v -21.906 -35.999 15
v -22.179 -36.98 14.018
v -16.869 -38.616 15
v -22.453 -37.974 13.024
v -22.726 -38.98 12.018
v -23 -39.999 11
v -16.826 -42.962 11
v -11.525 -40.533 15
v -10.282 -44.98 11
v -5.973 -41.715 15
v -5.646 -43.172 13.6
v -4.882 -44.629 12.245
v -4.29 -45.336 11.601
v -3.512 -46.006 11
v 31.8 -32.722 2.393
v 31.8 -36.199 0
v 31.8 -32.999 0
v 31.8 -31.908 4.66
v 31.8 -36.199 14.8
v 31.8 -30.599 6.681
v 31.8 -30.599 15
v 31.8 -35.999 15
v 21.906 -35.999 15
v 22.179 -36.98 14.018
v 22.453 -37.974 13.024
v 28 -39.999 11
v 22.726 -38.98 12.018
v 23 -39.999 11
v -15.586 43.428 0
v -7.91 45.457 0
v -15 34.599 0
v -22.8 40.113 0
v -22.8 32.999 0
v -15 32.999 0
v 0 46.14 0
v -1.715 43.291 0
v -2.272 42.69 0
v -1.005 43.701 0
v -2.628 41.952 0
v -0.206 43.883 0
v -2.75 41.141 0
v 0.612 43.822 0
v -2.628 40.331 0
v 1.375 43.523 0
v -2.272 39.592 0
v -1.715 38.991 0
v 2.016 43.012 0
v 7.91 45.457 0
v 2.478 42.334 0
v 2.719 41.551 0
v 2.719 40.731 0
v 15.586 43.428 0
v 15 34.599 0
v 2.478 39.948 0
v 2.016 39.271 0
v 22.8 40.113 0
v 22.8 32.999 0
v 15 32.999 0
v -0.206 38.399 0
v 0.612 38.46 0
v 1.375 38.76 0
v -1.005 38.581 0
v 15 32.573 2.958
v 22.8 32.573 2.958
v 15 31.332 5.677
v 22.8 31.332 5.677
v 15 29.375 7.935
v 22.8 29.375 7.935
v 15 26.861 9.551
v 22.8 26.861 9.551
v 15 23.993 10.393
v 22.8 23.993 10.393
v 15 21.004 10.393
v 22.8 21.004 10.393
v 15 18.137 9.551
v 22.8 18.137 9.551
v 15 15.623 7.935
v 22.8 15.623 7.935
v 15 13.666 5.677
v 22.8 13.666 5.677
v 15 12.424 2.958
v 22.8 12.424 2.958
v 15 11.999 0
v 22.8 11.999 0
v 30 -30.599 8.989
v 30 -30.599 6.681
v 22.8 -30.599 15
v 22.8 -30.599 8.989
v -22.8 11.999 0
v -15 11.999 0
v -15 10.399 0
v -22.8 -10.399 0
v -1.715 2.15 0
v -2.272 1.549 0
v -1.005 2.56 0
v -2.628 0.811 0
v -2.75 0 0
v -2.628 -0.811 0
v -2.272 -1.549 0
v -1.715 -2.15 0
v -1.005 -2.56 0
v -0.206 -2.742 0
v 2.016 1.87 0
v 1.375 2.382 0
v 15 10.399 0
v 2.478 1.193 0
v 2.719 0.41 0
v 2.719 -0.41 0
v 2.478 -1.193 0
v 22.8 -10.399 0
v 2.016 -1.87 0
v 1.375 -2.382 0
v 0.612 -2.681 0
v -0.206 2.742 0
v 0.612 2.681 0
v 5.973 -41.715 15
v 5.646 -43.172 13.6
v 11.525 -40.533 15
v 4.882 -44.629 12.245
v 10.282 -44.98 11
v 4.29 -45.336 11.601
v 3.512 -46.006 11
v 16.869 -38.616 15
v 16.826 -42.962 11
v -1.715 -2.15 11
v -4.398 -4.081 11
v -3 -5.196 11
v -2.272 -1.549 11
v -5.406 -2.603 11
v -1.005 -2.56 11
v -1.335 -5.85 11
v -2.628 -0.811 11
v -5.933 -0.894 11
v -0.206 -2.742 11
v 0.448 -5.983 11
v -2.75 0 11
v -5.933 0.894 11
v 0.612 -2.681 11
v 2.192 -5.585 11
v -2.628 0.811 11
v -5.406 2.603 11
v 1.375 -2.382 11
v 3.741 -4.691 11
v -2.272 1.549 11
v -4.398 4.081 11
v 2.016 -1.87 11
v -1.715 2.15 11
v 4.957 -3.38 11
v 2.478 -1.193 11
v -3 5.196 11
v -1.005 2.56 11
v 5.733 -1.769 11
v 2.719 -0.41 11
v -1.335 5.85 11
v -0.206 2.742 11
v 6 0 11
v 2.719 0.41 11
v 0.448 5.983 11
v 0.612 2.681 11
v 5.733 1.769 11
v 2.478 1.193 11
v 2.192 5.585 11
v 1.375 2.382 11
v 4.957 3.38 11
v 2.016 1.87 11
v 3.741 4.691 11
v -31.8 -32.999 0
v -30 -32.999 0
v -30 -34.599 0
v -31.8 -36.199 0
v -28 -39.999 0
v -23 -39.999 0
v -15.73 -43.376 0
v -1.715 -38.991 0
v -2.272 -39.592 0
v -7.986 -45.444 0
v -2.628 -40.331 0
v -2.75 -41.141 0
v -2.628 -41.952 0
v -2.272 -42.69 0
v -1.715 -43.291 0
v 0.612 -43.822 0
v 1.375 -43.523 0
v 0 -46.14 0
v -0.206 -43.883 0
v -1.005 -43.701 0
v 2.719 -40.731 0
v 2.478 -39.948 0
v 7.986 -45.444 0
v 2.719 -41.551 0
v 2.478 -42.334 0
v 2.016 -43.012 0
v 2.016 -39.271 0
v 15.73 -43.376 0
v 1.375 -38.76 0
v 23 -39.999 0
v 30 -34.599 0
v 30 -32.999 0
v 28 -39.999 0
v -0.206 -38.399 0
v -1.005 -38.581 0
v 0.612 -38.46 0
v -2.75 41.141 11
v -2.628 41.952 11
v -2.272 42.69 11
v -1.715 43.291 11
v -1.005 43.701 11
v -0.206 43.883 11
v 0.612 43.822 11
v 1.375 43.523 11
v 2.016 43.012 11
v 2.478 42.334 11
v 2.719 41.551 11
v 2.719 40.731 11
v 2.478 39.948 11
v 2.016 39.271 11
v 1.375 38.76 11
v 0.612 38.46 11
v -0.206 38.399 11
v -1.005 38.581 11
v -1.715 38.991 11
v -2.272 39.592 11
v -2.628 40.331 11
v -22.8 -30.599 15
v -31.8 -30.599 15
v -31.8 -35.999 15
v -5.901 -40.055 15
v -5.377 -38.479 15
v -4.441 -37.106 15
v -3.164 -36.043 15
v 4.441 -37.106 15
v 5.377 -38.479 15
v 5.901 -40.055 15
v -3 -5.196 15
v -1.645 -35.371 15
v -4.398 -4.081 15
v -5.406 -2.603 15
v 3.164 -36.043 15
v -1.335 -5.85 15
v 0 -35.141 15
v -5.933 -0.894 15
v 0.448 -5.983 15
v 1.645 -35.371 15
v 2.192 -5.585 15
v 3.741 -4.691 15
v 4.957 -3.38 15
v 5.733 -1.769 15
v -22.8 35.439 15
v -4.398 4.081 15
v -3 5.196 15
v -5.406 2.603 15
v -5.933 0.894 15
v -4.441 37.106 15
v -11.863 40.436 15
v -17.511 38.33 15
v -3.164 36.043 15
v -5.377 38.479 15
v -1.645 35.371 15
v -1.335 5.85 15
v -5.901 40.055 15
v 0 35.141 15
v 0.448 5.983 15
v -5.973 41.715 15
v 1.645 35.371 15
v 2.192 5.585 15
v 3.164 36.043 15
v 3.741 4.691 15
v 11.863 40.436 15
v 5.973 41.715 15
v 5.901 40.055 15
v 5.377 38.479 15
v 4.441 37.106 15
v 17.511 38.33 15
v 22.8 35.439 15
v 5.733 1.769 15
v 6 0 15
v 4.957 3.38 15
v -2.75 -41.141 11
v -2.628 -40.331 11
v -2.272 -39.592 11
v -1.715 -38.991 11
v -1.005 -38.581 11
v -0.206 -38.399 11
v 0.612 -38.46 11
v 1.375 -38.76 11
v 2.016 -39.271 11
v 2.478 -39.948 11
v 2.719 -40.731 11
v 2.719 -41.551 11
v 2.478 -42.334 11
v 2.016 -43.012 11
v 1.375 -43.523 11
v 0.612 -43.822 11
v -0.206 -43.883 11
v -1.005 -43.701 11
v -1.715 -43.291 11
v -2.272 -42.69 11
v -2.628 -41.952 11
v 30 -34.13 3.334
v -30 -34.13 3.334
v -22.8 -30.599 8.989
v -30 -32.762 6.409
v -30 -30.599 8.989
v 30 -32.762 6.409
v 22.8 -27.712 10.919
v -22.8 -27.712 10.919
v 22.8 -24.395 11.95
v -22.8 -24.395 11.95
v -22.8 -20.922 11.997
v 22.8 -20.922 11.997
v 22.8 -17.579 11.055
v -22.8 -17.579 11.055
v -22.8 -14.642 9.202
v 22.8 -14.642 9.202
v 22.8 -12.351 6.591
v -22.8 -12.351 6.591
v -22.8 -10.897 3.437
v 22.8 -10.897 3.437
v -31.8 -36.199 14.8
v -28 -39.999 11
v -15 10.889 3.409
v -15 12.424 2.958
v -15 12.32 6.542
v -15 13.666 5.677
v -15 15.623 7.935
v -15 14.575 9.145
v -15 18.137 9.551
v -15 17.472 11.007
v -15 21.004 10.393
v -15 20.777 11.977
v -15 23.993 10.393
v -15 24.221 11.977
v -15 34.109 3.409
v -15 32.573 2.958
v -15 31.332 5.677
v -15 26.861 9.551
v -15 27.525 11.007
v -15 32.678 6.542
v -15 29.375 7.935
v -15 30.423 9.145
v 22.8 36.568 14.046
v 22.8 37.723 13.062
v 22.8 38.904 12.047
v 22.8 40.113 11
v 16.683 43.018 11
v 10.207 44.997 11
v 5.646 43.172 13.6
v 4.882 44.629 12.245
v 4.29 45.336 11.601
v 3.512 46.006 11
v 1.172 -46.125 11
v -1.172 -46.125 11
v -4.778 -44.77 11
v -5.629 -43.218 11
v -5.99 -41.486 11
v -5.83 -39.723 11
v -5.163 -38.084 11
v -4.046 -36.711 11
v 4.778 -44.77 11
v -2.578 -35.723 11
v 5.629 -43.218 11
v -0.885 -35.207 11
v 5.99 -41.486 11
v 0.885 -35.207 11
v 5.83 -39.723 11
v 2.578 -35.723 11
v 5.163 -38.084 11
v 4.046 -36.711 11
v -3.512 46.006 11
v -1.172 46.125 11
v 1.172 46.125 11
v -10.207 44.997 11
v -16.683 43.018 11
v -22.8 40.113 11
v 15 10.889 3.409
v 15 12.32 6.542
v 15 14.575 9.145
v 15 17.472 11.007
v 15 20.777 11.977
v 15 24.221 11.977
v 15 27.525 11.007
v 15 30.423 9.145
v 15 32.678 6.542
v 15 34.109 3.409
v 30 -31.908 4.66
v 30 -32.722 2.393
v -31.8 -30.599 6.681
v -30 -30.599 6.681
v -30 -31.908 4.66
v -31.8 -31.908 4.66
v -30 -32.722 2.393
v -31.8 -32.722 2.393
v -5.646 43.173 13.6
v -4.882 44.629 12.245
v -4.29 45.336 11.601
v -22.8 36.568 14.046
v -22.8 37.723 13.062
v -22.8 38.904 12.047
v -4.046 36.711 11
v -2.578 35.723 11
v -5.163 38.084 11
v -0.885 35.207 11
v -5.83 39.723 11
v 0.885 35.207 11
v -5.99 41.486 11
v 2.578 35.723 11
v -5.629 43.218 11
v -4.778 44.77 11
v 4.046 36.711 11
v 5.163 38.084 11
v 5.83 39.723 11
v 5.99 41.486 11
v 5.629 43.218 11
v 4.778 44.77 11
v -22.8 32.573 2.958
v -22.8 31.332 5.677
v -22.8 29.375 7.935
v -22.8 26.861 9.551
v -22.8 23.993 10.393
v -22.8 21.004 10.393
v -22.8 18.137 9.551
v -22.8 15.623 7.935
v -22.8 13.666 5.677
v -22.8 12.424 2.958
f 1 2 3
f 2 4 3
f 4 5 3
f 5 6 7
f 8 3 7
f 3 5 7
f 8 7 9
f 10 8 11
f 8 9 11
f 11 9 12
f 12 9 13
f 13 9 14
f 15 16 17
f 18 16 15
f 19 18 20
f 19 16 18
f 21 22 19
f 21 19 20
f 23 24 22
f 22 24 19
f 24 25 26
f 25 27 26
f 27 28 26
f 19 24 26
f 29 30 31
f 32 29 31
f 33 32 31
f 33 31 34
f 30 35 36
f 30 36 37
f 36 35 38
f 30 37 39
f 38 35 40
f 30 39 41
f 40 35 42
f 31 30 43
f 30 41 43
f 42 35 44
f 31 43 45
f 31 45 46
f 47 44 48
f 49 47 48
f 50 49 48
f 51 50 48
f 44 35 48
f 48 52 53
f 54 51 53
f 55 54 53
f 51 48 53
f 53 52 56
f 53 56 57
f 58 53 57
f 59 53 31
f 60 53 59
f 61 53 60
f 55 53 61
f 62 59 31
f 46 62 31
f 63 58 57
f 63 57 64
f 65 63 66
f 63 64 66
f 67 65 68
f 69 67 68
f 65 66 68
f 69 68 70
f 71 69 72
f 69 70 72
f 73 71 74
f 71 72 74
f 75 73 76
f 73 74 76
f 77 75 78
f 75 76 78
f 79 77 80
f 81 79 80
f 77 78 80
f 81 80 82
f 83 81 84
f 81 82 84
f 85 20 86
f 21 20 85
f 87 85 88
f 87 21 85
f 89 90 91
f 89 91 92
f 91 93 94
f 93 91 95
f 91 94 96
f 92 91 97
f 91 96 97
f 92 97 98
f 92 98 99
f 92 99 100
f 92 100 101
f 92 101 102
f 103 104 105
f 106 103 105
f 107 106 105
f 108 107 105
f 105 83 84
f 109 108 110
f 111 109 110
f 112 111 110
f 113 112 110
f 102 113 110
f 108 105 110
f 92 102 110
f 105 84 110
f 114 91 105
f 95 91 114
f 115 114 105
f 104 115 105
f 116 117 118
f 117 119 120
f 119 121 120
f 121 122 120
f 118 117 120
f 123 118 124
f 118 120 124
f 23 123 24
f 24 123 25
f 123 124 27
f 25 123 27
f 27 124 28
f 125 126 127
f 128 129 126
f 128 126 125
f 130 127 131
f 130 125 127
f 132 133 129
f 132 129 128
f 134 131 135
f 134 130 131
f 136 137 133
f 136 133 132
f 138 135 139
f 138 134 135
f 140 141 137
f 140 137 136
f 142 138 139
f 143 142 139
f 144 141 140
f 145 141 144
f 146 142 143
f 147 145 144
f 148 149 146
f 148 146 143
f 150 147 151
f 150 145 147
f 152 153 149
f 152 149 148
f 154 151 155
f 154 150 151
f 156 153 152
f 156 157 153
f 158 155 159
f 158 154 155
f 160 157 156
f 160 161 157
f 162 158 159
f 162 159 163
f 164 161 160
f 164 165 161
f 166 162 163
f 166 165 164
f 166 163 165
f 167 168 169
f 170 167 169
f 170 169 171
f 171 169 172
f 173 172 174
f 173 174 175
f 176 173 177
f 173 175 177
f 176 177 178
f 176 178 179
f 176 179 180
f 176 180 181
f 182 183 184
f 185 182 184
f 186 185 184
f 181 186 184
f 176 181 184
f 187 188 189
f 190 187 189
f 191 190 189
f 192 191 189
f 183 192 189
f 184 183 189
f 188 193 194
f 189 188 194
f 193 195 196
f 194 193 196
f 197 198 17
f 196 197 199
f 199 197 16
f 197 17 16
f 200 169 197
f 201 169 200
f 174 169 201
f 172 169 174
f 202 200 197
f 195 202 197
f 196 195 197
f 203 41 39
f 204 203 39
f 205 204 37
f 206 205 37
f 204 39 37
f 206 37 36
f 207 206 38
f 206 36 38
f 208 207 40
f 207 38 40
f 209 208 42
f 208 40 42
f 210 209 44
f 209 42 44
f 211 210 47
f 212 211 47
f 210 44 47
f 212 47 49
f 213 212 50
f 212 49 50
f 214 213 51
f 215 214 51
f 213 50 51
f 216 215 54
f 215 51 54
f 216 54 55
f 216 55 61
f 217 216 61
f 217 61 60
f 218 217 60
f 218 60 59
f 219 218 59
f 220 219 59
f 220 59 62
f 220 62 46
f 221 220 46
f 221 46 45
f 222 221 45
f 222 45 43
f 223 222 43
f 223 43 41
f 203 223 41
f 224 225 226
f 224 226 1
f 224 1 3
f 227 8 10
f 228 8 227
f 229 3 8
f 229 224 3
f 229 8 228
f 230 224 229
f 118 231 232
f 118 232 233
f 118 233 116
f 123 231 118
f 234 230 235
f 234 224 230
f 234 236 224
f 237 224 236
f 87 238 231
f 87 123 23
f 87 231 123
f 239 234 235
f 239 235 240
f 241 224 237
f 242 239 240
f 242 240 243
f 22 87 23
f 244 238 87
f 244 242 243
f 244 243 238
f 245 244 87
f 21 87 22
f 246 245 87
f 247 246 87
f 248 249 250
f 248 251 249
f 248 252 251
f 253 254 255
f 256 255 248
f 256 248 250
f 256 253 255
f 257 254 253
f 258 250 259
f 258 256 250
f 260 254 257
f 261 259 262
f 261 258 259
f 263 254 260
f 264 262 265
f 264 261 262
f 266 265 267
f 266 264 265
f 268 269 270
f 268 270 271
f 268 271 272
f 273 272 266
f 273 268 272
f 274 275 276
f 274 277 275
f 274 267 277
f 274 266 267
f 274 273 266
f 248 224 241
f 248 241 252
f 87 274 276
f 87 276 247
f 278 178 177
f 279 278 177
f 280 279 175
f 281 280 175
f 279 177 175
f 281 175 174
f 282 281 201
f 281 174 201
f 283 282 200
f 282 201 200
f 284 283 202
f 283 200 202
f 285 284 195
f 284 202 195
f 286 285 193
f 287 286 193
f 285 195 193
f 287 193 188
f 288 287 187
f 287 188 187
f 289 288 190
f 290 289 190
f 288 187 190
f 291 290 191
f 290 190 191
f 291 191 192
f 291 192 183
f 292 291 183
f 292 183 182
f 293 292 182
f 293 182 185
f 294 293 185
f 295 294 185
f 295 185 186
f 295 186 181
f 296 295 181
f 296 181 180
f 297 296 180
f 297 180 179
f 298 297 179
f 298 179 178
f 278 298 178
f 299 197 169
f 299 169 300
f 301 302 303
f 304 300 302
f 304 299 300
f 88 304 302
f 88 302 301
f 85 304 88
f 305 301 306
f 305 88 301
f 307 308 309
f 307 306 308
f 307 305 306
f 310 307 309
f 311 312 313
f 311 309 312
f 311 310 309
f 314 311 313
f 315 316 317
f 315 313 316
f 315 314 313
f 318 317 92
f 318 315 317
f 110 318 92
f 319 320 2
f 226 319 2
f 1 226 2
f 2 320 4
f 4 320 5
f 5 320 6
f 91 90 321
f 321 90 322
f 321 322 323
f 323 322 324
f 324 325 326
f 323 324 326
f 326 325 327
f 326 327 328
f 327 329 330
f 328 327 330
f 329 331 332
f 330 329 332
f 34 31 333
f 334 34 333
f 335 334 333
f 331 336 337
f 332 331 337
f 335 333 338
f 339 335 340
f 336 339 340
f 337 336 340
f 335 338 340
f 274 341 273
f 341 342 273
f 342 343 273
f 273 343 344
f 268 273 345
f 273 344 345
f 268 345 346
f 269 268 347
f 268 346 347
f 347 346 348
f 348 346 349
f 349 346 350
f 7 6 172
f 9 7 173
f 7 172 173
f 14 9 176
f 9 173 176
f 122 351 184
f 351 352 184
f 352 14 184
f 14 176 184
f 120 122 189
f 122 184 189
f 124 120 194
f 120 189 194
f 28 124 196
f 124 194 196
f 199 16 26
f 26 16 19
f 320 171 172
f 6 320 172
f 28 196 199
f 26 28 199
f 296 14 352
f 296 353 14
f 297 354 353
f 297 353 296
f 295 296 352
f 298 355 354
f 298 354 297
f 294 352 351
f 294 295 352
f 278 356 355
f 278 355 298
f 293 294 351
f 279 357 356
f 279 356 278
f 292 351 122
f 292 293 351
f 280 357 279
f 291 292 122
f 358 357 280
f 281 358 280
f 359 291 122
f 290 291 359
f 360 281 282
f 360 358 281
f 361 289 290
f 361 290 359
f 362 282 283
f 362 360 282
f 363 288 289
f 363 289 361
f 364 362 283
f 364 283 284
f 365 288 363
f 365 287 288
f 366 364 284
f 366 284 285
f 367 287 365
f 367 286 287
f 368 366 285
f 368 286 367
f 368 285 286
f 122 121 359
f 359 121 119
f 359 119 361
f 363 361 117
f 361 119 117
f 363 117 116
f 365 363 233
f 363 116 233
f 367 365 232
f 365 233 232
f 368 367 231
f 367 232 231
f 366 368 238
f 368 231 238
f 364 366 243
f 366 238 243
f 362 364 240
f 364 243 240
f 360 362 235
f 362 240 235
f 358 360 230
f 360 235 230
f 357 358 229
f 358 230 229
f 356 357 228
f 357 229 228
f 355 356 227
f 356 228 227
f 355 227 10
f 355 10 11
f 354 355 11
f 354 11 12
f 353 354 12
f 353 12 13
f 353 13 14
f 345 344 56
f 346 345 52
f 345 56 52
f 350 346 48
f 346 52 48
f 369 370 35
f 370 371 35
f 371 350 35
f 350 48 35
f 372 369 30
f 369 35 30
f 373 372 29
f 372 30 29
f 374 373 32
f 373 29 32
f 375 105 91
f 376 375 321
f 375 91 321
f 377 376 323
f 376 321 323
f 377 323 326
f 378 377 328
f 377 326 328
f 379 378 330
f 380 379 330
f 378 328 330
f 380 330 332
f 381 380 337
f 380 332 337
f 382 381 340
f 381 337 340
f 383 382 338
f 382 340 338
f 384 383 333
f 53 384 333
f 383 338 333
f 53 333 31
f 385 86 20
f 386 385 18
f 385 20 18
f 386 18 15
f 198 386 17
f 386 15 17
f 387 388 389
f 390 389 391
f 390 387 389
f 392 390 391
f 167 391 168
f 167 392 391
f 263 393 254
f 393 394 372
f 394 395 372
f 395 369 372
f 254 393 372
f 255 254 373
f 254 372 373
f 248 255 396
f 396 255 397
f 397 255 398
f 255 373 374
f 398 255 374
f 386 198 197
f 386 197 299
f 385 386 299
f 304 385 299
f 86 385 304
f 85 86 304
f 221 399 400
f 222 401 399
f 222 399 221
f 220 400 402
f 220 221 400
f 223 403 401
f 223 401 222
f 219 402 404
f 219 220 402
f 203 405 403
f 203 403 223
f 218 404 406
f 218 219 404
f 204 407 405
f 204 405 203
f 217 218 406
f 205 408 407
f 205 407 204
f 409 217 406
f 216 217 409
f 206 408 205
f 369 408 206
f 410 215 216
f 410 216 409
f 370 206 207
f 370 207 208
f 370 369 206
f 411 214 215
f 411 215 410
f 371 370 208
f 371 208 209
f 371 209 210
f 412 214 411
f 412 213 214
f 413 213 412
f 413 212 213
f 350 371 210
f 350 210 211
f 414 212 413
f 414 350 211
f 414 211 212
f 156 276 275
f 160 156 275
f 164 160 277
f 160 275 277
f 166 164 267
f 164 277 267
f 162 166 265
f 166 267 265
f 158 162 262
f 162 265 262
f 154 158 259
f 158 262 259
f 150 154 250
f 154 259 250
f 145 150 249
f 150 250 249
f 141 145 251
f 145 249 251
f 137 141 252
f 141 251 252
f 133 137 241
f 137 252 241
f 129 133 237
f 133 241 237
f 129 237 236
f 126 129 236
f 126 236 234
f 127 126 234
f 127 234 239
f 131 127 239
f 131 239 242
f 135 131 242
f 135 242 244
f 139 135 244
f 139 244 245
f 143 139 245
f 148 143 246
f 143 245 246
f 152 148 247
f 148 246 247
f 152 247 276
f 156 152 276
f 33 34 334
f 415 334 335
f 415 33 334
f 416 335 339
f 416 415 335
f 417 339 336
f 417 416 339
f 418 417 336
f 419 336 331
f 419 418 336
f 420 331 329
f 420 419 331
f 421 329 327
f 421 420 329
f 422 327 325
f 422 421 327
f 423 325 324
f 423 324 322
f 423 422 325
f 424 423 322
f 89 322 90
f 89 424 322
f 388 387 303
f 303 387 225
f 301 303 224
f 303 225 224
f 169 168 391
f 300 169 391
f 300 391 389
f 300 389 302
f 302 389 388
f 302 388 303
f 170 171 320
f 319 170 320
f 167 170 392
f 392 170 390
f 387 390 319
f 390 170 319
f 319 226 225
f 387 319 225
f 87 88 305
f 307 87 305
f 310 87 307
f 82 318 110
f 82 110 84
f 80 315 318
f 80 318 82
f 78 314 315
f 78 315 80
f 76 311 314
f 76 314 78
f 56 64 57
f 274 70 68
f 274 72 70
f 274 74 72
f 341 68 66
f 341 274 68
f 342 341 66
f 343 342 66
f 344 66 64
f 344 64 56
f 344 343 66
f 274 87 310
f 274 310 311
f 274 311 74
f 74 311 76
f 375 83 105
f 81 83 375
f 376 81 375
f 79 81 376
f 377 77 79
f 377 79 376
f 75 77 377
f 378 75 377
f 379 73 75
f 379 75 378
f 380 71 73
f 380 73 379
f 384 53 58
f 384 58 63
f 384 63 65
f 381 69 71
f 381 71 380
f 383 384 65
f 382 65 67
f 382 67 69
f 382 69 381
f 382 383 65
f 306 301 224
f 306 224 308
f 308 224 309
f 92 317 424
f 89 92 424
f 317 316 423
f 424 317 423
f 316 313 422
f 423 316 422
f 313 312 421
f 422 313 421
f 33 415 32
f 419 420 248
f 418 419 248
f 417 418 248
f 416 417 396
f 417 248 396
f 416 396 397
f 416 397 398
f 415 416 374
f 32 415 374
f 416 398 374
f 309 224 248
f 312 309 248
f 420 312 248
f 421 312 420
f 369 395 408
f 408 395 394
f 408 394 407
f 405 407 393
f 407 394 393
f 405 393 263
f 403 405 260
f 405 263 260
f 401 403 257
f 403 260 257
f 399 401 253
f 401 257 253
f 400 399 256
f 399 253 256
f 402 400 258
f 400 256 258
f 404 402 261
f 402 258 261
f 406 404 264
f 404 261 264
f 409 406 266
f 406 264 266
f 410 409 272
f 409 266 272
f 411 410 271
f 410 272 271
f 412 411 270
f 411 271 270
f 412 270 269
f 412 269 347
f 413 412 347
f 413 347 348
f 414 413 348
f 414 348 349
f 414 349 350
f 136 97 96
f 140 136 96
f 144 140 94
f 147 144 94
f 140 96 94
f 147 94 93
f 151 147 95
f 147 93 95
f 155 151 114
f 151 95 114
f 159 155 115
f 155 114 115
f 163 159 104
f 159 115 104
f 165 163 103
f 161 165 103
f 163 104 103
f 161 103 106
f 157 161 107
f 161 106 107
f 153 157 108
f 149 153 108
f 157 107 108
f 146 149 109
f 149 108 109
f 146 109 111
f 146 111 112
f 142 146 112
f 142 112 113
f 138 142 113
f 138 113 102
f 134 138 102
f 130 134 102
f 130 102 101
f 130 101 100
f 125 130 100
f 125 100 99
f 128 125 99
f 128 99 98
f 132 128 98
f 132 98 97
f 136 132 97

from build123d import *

# Parameters (mm, degrees)
BOSS_EXTRUDE1_DEPTH     = 15
SKETCH7_R               = 12.1
CUT_EXTRUDE3_DEPTH      = 71.5
SKETCH8_R               = 12.1
CUT_EXTRUDE4_DEPTH      = 71.5
CUT_EXTRUDE4_DEPTH_BACK = 71.5
BOSS_EXTRUDE4_DEPTH     = 8
BOSS_EXTRUDE5_DEPTH     = 2
SKETCH11_R              = 2.75
CUT_EXTRUDE5_DEPTH      = 24
SKETCH12_R              = 6
CUT_EXTRUDE6_DEPTH      = 4
CHAMFER1_SIZE           = 4
CUT_EXTRUDE7_DEPTH      = 28


with BuildPart() as part:
    # Sketch1 → Boss-Extrude1 (new body)
    with BuildSketch(Plane.XY):
        with BuildLine():
            Line((-23, -30.39874498), (-32, -30.39874498))
            Line((-32, -30.39874498), (-32, -39.99874498))
            Line((-32, -39.99874498), (-23, -39.99874498))
            ThreePointArc((-23, -39.99874498), (0, -46.14), (23, -39.99874498))
            Line((23, -39.99874498), (32, -39.99874498))
            Line((32, -39.99874498), (32, -30.39874498))
            Line((32, -30.39874498), (23, -30.39874498))
            Line((23, -30.39874498), (23, 39.99874498))
            ThreePointArc((23, 39.99874498), (0, 46.14), (-23, 39.99874498))
            Line((-23, 39.99874498), (-23, -30.39874498))
        make_face()
    extrude(amount=BOSS_EXTRUDE1_DEPTH)

    # Sketch7 → Cut-Extrude3 (cut)
    with BuildSketch(Plane.ZY.offset(23)):
        with Locations((0, 22.49874498)):
            Circle(SKETCH7_R)
    extrude(amount=-CUT_EXTRUDE3_DEPTH, mode=Mode.SUBTRACT)

    # Sketch8 → Cut-Extrude4 (cut, two sides)
    with BuildSketch(Plane.ZY.offset(23)) as cut_extrude4_sk:
        with Locations((0, -22.49874498)):
            Circle(SKETCH8_R)
    extrude(amount=CUT_EXTRUDE4_DEPTH, mode=Mode.SUBTRACT)
    extrude(cut_extrude4_sk.sketch, amount=-CUT_EXTRUDE4_DEPTH_BACK, mode=Mode.SUBTRACT)

    # Sketch9 → Boss-Extrude4 (add)
    with BuildSketch(Plane.ZY.offset(23)):
        with BuildLine():
            Line((0, 34.59874498), (0, 32.99874498))
            ThreePointArc((0, 32.99874498), (10.5, 22.49874498), (0, 11.99874498))
            Line((0, 11.99874498), (0, 10.39874498))
            ThreePointArc((0, 10.39874498), (12.1, 22.49874498), (0, 34.59874498))
        make_face()
    boss_extrude4 = extrude(amount=-BOSS_EXTRUDE4_DEPTH)

    # Sketch10 → Boss-Extrude5 (add)
    with BuildSketch(Plane.ZY.offset(32)):
        with BuildLine():
            Line((0, -32.99874498), (0, -34.59874498))
            ThreePointArc((0, -34.59874498), (5.040833264, -33.49874498), (9.16515139, -30.39874498))
            Line((9.16515139, -30.39874498), (6.916646586, -30.39874498))
            ThreePointArc((6.916646586, -30.39874498), (3.69459064, -32.327274881), (0, -32.99874498))
        make_face()
    boss_extrude5 = extrude(amount=-BOSS_EXTRUDE5_DEPTH)

    # Mirror1: Boss-Extrude4, Boss-Extrude5 across plane
    add(boss_extrude4.mirror(Plane(origin=(0, 0, 0), x_dir=(0, 0, 1), z_dir=(1, 0, 0))))
    add(boss_extrude5.mirror(Plane(origin=(0, 0, 0), x_dir=(0, 0, 1), z_dir=(1, 0, 0))))

    # Sketch11 → Cut-Extrude5 (cut)
    with BuildSketch(Plane(origin=(0, 0, 0), x_dir=(-1, 0, 0), z_dir=(0, 0, -1))):
        Circle(SKETCH11_R)
        with Locations((0, 41.14108798)):
            Circle(SKETCH11_R)
        with Locations((0, -41.14108798)):
            Circle(SKETCH11_R)
    extrude(amount=-CUT_EXTRUDE5_DEPTH, mode=Mode.SUBTRACT)

    # Sketch12 → Cut-Extrude6 (cut)
    with BuildSketch(Plane.XY.offset(15)):
        Circle(SKETCH12_R)
        with Locations((0, -41.14108798)):
            Circle(SKETCH12_R)
        with Locations((0, 41.14108798)):
            Circle(SKETCH12_R)
    extrude(amount=-CUT_EXTRUDE6_DEPTH, mode=Mode.SUBTRACT)

    # Chamfer1
    chamfer1_edges = [part.edges().sort_by_distance(p)[0] for p in [
        (-13.591823685, 44.092651643, 15),
        (13.591823685, 44.092651643, 15),
        (13.591823685, -44.092651643, 15),
        (27.5, -39.99874498, 15),
        (32, -39.99874498, 7.5),
        (-13.591823685, -44.092651643, 15),
        (-27.5, -39.99874498, 15),
        (-32, -39.99874498, 7.5),
    ]]
    chamfer(chamfer1_edges, length=CHAMFER1_SIZE)

    # Sketch13 → Cut-Extrude7 (cut)
    with BuildSketch(Plane.XY.offset(15)):
        Polygon((31.8, -38.311994276), (31.8, -30.59874498), (22.8, -30.59874498), (22.8, 43.889056734), (37.227618098, 33.583615236), (38.561263468, -37.220829882), align=None)
        Polygon((-37.227618098, 33.583615236), (-38.561263468, -37.220829882), (-31.8, -38.311994276), (-31.8, -30.59874498), (-22.8, -30.59874498), (-22.8, 43.889056734), align=None)
    extrude(amount=-CUT_EXTRUDE7_DEPTH, mode=Mode.SUBTRACT)


solid = part.part
